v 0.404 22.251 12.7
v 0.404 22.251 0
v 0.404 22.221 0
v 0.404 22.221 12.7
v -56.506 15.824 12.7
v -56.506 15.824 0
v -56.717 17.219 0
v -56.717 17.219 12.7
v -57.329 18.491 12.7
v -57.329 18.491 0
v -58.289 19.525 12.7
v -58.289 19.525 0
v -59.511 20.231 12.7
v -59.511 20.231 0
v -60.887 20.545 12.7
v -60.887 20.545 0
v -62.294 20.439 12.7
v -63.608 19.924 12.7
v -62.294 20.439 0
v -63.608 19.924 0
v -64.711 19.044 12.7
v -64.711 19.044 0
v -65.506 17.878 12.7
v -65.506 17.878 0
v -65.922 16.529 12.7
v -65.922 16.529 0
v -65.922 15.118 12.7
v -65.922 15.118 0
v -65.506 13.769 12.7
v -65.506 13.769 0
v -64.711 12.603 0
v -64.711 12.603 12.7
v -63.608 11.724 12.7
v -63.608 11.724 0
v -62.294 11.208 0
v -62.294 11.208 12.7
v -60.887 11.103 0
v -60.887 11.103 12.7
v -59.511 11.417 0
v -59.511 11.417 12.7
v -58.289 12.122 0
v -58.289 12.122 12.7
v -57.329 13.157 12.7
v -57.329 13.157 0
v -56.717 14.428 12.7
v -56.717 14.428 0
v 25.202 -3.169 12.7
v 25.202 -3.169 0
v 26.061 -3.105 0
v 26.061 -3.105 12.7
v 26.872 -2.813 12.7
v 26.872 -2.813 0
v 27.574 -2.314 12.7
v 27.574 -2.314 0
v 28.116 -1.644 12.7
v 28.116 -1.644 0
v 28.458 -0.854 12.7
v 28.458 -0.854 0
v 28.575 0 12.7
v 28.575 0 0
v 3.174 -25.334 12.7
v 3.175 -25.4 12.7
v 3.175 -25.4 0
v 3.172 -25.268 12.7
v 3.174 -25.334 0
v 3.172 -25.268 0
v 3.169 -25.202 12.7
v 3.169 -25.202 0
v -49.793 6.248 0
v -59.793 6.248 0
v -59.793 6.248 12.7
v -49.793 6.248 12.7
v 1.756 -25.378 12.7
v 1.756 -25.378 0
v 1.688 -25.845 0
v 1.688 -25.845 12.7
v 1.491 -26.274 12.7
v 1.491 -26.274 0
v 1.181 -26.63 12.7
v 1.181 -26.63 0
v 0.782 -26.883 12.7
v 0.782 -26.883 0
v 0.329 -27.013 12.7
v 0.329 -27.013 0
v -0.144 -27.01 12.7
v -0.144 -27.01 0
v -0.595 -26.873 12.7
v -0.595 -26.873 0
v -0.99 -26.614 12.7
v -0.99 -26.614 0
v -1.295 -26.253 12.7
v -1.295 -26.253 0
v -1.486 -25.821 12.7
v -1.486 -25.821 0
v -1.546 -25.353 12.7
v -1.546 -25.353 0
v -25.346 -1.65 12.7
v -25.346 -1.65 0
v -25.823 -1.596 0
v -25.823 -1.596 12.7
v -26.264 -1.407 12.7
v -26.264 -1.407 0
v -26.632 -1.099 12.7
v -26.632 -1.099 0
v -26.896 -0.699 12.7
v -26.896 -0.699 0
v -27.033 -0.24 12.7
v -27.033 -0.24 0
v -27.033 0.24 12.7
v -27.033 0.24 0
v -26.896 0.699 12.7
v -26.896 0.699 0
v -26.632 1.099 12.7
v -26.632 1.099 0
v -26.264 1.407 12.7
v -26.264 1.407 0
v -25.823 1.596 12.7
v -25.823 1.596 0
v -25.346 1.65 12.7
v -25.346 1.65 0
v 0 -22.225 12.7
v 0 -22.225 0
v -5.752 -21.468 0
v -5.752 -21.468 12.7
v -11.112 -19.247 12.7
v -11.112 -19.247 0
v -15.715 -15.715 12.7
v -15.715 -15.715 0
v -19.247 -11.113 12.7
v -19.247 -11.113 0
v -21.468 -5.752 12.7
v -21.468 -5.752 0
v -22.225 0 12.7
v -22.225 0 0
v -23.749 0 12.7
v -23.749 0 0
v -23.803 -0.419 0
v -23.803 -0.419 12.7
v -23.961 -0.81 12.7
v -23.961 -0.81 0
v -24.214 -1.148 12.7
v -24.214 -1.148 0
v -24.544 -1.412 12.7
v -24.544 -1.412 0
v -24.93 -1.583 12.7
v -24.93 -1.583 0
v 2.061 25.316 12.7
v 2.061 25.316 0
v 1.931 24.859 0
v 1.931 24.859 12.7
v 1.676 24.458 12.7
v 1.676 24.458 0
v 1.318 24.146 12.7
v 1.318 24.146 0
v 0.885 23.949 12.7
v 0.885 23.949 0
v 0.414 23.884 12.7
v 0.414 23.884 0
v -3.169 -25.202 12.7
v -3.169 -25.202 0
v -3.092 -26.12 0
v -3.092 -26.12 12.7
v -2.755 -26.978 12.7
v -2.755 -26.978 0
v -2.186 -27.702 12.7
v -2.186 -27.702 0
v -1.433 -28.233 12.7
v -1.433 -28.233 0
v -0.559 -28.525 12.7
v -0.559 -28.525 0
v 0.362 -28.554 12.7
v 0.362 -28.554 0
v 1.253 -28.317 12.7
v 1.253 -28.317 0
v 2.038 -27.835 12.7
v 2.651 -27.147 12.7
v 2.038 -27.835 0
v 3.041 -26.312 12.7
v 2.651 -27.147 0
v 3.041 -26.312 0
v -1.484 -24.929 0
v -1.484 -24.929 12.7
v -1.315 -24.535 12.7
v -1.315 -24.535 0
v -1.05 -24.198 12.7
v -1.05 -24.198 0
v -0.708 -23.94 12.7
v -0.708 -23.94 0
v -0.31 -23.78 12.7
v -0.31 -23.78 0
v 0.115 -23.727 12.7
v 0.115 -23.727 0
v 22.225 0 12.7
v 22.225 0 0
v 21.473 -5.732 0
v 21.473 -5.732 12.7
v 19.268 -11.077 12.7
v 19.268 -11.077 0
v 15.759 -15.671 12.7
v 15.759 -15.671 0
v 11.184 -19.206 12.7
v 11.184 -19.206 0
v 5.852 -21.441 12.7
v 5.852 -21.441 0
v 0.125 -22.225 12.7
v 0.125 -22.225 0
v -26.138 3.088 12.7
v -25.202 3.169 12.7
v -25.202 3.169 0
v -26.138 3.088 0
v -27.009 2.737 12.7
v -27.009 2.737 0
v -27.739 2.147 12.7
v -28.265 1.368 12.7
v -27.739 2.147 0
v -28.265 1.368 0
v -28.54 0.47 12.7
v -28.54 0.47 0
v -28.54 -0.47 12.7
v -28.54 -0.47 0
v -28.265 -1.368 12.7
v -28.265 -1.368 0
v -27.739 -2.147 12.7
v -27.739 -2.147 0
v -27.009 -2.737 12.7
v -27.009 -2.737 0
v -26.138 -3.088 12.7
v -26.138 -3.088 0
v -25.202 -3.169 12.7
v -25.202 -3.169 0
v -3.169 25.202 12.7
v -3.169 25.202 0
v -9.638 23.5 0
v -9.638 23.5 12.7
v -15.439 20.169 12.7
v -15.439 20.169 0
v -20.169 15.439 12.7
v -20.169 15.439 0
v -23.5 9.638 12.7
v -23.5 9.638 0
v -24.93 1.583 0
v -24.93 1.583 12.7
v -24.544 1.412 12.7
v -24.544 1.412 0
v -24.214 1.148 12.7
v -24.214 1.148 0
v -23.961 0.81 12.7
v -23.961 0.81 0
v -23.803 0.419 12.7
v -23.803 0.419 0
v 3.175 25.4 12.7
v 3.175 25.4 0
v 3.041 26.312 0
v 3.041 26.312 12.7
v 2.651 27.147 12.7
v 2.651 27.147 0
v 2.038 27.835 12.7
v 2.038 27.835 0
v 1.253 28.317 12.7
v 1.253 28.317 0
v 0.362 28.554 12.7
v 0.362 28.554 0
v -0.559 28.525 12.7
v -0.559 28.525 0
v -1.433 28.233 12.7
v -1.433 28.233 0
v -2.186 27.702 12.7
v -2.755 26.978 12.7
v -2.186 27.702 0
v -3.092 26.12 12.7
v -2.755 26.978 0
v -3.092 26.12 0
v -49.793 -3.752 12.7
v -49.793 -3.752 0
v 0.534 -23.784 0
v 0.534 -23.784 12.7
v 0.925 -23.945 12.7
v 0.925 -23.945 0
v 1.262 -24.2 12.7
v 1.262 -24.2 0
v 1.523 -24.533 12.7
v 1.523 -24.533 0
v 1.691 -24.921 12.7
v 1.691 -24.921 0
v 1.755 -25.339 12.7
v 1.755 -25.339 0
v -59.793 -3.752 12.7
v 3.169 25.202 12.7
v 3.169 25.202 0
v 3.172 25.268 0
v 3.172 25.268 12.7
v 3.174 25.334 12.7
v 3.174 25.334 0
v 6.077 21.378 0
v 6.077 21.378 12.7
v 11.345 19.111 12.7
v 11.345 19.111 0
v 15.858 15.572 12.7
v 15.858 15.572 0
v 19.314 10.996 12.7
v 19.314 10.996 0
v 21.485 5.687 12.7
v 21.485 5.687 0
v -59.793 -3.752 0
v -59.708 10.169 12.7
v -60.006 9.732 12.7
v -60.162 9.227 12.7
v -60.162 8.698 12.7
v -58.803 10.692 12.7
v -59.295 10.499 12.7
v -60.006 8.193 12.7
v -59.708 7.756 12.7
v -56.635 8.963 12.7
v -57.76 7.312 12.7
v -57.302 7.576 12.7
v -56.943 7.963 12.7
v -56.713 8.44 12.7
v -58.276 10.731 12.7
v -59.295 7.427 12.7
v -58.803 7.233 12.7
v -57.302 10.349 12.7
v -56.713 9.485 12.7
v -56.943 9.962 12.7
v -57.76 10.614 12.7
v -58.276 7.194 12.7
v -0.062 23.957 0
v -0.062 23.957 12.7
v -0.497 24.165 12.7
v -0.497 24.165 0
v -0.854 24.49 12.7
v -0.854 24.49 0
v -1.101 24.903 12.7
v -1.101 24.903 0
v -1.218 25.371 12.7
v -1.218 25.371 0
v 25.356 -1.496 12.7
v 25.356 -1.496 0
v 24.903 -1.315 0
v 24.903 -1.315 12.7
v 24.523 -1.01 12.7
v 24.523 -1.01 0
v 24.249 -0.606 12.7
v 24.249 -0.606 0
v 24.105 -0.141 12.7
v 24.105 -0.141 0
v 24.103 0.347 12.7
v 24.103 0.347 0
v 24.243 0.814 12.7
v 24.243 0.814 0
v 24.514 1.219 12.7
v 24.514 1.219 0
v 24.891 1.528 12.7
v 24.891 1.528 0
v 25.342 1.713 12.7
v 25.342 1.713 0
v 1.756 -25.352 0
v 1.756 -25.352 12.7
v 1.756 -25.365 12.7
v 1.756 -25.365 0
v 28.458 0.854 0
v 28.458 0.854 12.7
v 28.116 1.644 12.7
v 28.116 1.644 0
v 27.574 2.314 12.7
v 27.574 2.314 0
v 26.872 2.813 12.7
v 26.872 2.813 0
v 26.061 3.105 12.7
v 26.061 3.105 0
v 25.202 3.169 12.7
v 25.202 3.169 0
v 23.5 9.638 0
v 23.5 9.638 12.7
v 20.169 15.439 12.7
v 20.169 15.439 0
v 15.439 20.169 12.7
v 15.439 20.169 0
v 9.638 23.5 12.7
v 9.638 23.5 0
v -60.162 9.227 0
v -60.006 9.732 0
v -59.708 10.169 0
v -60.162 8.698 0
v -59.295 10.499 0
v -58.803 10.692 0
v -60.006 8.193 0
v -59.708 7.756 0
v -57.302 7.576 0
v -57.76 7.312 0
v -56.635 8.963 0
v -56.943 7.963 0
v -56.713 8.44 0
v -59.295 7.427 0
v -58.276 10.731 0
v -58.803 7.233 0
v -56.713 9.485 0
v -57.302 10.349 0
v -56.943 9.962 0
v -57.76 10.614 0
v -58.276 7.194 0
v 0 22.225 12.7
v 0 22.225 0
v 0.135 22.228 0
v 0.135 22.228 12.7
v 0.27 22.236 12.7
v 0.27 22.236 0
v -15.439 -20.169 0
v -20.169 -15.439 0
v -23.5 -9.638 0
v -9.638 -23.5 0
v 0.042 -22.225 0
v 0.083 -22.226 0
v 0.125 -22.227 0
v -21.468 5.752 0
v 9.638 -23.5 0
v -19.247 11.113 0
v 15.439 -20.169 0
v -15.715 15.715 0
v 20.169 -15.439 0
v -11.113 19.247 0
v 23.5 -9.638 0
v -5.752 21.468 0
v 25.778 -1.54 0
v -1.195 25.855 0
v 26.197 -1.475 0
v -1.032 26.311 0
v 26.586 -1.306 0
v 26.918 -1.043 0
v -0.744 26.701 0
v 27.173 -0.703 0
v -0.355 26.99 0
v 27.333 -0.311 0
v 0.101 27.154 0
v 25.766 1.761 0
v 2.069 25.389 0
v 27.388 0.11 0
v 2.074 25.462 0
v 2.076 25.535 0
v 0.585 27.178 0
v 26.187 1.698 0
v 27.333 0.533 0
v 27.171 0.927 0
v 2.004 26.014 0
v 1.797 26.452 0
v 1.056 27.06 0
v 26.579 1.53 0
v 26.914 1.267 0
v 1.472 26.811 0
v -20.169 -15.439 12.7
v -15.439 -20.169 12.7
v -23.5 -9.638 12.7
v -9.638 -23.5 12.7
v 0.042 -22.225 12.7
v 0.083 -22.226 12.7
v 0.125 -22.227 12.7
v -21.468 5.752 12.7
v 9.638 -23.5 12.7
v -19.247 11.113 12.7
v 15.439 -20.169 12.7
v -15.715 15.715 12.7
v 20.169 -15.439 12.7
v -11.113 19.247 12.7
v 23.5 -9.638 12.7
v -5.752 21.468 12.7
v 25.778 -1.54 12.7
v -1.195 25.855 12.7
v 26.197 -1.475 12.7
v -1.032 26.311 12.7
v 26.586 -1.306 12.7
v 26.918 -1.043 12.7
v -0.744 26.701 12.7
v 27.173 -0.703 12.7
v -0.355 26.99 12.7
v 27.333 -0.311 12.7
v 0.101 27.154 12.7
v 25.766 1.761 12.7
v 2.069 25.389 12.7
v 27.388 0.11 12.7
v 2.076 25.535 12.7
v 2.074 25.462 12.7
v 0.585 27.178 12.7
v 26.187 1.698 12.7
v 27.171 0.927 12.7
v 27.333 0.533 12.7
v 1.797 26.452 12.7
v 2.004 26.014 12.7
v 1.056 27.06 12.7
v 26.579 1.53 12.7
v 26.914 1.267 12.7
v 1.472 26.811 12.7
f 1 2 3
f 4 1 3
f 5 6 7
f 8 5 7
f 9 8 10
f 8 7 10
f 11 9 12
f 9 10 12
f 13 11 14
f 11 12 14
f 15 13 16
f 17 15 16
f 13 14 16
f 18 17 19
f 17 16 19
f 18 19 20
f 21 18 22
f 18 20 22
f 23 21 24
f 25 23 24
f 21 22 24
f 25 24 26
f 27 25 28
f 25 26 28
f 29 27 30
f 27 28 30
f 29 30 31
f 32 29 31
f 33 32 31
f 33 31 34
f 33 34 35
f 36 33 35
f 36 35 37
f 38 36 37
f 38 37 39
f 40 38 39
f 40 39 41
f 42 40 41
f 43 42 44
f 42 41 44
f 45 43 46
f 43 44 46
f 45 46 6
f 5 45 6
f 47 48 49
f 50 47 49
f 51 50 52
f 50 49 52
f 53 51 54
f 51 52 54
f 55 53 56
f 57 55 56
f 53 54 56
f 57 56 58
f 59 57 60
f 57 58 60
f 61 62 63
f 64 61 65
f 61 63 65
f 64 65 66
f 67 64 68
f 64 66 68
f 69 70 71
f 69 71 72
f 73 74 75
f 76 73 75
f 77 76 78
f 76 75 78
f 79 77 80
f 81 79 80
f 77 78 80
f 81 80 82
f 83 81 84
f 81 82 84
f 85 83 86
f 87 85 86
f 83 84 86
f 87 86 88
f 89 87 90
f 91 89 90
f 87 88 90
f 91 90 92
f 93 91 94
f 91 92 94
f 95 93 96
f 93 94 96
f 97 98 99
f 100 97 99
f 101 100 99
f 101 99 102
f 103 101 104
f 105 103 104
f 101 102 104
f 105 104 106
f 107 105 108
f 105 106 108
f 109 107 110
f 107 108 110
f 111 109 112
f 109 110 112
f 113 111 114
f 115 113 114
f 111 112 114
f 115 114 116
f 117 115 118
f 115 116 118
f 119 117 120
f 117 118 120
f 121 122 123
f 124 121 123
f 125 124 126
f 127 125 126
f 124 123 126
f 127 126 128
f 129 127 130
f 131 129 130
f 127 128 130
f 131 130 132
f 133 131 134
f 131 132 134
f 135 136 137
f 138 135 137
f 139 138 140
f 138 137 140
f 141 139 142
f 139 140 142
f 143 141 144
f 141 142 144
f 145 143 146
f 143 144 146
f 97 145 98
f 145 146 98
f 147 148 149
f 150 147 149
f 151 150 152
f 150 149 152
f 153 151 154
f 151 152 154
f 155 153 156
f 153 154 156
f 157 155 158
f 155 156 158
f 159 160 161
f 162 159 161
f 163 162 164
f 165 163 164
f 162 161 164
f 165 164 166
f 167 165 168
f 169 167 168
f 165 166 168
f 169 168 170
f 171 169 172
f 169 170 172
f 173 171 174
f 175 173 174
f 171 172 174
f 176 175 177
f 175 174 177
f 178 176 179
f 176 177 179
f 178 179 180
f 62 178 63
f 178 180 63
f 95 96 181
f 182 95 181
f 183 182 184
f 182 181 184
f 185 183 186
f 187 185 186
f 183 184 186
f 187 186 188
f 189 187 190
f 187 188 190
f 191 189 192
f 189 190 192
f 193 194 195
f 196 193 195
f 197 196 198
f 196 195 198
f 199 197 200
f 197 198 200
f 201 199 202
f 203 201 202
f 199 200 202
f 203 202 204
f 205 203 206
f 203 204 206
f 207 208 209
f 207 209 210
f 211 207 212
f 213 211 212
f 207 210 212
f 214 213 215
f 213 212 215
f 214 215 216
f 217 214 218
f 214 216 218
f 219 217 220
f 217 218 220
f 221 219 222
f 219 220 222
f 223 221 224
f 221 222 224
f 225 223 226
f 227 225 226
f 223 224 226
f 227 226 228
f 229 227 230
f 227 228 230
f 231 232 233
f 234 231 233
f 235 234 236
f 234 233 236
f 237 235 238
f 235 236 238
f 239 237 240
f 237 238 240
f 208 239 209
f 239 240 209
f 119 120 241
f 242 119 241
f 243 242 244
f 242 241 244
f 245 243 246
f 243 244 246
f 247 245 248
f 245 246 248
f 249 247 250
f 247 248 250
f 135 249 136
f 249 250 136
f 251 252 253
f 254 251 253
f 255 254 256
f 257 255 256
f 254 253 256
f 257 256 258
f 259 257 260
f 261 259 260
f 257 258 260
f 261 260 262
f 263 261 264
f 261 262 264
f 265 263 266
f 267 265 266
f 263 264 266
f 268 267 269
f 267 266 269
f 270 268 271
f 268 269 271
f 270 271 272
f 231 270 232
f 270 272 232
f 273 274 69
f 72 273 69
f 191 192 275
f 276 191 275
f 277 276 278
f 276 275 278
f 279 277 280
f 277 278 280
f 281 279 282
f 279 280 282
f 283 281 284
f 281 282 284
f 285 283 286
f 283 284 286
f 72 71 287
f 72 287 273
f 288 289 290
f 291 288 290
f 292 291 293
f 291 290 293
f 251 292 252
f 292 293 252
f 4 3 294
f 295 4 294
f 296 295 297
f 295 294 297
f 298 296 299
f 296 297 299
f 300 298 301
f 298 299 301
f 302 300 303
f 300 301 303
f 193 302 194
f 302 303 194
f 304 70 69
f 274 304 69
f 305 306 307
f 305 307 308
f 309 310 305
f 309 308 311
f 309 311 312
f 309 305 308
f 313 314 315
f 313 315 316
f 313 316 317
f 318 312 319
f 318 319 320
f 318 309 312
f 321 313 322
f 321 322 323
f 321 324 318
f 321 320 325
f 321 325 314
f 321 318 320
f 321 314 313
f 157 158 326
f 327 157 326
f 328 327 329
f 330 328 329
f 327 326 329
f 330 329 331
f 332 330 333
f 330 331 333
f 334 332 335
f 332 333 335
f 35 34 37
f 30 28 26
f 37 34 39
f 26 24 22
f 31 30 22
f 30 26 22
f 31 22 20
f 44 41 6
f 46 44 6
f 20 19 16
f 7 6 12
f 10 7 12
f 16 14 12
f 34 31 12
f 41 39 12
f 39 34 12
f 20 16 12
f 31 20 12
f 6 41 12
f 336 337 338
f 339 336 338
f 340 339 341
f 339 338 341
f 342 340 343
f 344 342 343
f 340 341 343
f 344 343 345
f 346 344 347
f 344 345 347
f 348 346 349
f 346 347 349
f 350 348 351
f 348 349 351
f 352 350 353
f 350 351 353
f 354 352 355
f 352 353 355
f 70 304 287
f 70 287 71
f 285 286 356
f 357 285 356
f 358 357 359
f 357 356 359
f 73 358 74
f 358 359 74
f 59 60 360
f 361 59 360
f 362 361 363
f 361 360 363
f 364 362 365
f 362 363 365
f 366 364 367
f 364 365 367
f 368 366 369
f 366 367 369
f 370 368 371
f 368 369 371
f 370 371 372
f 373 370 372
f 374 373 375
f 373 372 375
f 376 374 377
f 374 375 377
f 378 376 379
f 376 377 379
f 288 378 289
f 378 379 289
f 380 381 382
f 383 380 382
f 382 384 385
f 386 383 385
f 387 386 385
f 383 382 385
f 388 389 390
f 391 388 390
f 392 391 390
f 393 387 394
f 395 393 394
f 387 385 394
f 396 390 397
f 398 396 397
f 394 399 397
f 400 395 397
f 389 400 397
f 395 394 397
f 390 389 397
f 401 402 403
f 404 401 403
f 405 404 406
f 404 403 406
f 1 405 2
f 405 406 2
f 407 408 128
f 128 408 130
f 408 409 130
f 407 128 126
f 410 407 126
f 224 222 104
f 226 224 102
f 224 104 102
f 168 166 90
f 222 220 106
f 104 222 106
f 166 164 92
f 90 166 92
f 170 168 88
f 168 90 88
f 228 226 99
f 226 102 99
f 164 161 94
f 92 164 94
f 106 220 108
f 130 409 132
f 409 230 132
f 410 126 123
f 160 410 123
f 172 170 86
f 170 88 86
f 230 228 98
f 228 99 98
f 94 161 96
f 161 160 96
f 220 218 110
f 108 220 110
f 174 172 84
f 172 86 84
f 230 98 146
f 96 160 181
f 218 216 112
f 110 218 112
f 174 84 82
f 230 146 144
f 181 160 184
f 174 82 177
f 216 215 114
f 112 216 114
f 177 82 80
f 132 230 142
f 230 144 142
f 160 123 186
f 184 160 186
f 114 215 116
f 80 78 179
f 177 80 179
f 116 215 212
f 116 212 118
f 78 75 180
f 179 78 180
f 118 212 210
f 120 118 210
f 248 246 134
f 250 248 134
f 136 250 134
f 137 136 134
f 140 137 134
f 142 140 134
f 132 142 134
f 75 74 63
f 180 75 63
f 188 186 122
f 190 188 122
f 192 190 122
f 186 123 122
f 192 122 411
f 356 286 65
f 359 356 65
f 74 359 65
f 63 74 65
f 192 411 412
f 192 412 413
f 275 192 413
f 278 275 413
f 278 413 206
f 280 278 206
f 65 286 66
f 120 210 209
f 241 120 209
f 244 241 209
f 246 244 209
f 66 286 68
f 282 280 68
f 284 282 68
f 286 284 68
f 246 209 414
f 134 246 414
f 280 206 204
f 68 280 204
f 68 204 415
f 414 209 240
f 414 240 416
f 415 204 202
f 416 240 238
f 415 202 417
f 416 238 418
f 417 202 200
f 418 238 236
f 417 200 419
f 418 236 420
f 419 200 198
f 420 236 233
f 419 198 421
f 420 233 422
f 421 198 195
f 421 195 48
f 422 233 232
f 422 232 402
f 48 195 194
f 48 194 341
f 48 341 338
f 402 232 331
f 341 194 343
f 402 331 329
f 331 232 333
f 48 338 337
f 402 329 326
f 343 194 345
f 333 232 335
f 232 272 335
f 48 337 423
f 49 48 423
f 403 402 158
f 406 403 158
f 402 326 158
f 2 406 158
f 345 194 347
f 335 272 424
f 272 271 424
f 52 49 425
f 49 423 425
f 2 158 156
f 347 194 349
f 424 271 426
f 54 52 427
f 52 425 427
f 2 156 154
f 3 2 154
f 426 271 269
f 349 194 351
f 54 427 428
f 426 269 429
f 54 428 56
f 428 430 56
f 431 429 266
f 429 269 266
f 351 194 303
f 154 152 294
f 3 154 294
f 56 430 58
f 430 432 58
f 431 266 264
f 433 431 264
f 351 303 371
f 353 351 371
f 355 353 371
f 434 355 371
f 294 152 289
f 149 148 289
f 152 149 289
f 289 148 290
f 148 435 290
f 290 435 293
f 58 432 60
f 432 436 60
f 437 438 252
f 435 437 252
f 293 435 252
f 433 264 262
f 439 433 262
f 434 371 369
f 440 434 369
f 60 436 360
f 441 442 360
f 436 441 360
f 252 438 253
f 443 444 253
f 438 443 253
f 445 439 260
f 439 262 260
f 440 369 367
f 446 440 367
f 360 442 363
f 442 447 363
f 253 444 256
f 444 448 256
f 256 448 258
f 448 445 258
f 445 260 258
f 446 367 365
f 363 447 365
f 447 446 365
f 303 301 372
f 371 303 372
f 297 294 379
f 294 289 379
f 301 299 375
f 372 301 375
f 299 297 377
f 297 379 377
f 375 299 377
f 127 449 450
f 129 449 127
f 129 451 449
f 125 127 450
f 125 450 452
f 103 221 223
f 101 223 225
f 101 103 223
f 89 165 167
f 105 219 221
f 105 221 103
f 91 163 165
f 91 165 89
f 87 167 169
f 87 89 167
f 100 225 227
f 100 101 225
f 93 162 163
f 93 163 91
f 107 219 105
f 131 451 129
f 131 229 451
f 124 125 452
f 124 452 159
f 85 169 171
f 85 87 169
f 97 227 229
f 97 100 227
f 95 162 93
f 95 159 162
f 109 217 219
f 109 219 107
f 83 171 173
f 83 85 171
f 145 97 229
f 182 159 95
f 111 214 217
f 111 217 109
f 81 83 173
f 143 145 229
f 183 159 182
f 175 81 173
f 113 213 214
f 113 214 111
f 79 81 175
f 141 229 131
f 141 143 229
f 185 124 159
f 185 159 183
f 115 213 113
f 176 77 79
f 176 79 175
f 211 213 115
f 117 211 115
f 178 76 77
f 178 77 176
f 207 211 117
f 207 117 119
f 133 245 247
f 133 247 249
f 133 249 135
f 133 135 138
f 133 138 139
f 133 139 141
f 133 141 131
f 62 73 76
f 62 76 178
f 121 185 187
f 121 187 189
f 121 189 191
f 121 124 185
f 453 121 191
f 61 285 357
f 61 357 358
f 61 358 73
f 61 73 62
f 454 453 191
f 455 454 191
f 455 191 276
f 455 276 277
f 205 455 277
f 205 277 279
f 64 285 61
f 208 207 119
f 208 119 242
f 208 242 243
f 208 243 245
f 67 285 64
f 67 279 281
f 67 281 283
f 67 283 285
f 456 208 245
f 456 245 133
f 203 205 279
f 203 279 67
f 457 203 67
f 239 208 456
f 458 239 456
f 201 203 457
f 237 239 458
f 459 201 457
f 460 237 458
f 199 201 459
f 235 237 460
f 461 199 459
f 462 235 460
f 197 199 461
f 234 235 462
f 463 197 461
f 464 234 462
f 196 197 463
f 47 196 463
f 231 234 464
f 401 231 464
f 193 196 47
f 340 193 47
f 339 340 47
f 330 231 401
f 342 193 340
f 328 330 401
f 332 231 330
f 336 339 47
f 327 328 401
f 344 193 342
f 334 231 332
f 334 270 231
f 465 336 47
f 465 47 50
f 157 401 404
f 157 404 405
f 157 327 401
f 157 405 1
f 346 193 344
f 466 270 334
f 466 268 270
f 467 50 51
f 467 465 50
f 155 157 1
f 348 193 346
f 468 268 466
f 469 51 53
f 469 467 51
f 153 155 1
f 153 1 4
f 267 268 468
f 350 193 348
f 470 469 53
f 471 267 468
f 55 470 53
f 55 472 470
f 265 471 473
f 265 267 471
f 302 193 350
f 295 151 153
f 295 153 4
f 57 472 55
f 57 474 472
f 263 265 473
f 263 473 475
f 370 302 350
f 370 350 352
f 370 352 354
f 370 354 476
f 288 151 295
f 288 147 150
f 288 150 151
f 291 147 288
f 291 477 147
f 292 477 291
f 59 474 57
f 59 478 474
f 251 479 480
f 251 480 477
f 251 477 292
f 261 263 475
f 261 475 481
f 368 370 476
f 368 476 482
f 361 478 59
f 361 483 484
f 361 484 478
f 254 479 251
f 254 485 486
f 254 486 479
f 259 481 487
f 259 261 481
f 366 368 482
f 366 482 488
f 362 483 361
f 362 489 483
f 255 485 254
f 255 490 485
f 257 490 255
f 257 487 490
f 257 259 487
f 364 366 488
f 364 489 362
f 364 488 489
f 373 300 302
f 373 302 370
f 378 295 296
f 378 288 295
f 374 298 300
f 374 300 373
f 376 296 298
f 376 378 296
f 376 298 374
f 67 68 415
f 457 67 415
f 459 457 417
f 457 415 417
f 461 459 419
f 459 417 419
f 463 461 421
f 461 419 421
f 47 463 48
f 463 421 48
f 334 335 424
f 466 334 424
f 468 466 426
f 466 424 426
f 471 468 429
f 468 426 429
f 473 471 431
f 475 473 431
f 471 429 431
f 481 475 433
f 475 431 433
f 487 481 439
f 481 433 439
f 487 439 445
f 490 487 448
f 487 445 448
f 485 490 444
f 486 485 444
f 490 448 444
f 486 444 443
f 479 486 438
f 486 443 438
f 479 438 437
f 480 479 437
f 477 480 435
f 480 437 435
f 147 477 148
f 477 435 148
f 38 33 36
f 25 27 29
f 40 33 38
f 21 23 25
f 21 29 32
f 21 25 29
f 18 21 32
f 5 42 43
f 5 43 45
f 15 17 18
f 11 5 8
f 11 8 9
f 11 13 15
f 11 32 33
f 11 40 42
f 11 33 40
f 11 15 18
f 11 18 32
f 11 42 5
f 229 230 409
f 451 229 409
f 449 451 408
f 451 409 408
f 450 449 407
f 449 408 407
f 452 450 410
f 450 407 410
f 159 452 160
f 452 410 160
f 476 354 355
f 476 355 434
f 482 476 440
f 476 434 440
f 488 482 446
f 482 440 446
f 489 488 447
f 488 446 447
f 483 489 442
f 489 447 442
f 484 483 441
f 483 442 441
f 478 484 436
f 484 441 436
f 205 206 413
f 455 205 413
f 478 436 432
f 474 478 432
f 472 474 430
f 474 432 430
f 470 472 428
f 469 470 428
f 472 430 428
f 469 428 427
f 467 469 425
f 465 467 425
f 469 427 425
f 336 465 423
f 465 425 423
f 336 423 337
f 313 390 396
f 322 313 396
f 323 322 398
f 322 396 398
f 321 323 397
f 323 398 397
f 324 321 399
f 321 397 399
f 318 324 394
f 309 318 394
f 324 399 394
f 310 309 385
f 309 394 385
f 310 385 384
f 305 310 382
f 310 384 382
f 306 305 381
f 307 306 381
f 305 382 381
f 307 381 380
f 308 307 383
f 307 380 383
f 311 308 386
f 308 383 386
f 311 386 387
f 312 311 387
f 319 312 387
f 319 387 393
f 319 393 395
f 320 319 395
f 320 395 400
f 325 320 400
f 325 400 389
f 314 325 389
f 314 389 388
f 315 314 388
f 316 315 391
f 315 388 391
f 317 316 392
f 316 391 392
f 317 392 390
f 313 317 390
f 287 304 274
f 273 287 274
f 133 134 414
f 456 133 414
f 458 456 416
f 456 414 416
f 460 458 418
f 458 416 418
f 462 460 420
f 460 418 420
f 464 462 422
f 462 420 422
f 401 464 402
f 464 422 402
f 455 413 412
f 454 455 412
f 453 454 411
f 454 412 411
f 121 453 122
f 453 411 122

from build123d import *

# Parameters (mm, degrees)
F1_DEPTH = 12.7
F0_R     = 4.7343044343
F0_R_2   = 1.7736738102
F0_W     = 10
F0_H     = 10


with BuildPart() as f1:
    # F0 (on Top) → F1 (new body)
    with BuildSketch(Plane.XY):
        with BuildLine():
            ThreePointArc((25.3558840705, -1.4963766246), (24.085578025, 0.1030713696), (25.3421485002, 1.7133328318))
            ThreePointArc((25.3421485002, 1.7133328318), (25.2823312082, 2.4420746672), (25.2015625, 3.1687927604))
            ThreePointArc((25.2015625, 3.1687927604), (23.0858409667, 2.1737739001), (22.225, 0))
            ThreePointArc((22.225, 0), (23.0858409667, -2.1737739001), (25.2015625, -3.1687927604))
            ThreePointArc((25.2015625, -3.1687927604), (25.2925501851, -2.3338605645), (25.3558840705, -1.4963766246))
        make_face()
        with BuildLine():
            ThreePointArc((25.2015625, 3.1687927604), (25.2823312082, 2.4420746672), (25.3421485002, 1.7133328318))
            ThreePointArc((25.3421485002, 1.7133328318), (26.755047766, 1.4095555078), (27.3875629077, 0.1101365633))
            ThreePointArc((27.3875629077, 0.1101365633), (26.7605990984, -1.1849120381), (25.3558840705, -1.4963766246))
            ThreePointArc((25.3558840705, -1.4963766246), (25.2925501851, -2.3338605645), (25.2015625, -3.1687927604))
            ThreePointArc((25.2015625, -3.1687927604), (27.5737739001, -2.3141590333), (28.575, 0))
            ThreePointArc((28.575, 0), (27.5737739001, 2.3141590333), (25.2015625, 3.1687927604))
        make_face()
        with BuildLine():
            ThreePointArc((22.225, 0), (23.0858409667, 2.1737739001), (25.2015625, 3.1687927604))
            ThreePointArc((25.2015625, 3.1687927604), (17.9605122421, 17.9605122421), (3.1687927604, 25.2015625))
            ThreePointArc((3.1687927604, 25.2015625), (2.3168608274, 23.2291059661), (0.4039338373, 22.2507997118))
            Line((0.4039338373, 22.2507997118), (0.4037487557, 22.221332362))
            ThreePointArc((0.4037487557, 22.221332362), (15.8575524766, 15.5720472146), (22.225, 0))
        make_face()
        with BuildLine():
            ThreePointArc((3.1687927604, -25.2015625), (17.9605122421, -17.9605122421), (25.2015625, -3.1687927604))
            ThreePointArc((25.2015625, -3.1687927604), (23.0858409667, -2.1737739001), (22.225, 0))
            ThreePointArc((22.225, 0), (15.7594350485, -15.671337912), (0.124587676, -22.2246507939))
            Line((0.124587676, -22.2246507939), (0.1245701278, -22.2274446761))
            ThreePointArc((0.1245701278, -22.2274446761), (2.2187618137, -23.1289383509), (3.1687927604, -25.2015625))
        make_face()
        with BuildLine():
            ThreePointArc((0.4039338373, 22.2507997118), (2.3168608274, 23.2291059661), (3.1687927604, 25.2015625))
            ThreePointArc((3.1687927604, 25.2015625), (2.6155497493, 25.2649737682), (2.0610495634, 25.3162413225))
            ThreePointArc((2.0610495634, 25.3162413225), (1.5081301648, 24.2889839746), (0.414189801, 23.8836791504))
            Line((0.414189801, 23.8836791504), (0.4039338373, 22.2507997118))
        make_face()
        with BuildLine():
            ThreePointArc((2.0610495634, 25.3162413225), (2.6155497493, 25.2649737682), (3.1687927604, 25.2015625))
            ThreePointArc((3.1687927604, 25.2015625), (3.1734478107, 25.3007327204), (3.175, 25.4))
            ThreePointArc((3.175, 25.4), (-0.0992672796, 28.5734478107), (-3.1687927604, 25.2015625))
            ThreePointArc((-3.1687927604, 25.2015625), (-2.1951707638, 25.3049644402), (-1.218287002, 25.3707661843))
            ThreePointArc((-1.218287002, 25.3707661843), (0.3425178179, 27.1836069196), (2.0755593736, 25.5346465856))
            ThreePointArc((2.0755593736, 25.5346465856), (2.0719279273, 25.4252032286), (2.0610495634, 25.3162413225))
        make_face()
        with BuildLine():
            ThreePointArc((3.175, -25.4), (3.1734478107, -25.3007327204), (3.1687927604, -25.2015625))
            ThreePointArc((3.1687927604, -25.2015625), (2.463027482, -25.2802985667), (1.7553369221, -25.3392737128))
            ThreePointArc((1.7553369221, -25.3392737128), (1.7556720559, -25.3584772275), (1.7557837723, -25.3776833415))
            ThreePointArc((1.7557837723, -25.3776833415), (0.0923942372, -27.0286368537), (-1.5460302791, -25.3529049692))
            ThreePointArc((-1.5460302791, -25.3529049692), (-2.3586257035, -25.2902527625), (-3.1687927604, -25.2015625))
            ThreePointArc((-3.1687927604, -25.2015625), (-0.0992672796, -28.5734478107), (3.175, -25.4))
        make_face()
        with BuildLine():
            ThreePointArc((1.7553369221, -25.3392737128), (2.463027482, -25.2802985667), (3.1687927604, -25.2015625))
            ThreePointArc((3.1687927604, -25.2015625), (2.2187618137, -23.1289383509), (0.1245701278, -22.2274446761))
            Line((0.1245701278, -22.2274446761), (0.1151533449, -23.7267159063))
            ThreePointArc((0.1151533449, -23.7267159063), (1.2622602266, -24.2003774094), (1.7553369221, -25.3392737128))
        make_face()
        with BuildLine():
            ThreePointArc((0, 22.225), (0.2023784636, 22.2314564927), (0.4039338373, 22.2507997118))
            Line((0.4039338373, 22.2507997118), (0.414189801, 23.8836791504))
            ThreePointArc((0.414189801, 23.8836791504), (-0.6872579246, 24.3141289514), (-1.218287002, 25.3707661843))
            ThreePointArc((-1.218287002, 25.3707661843), (-2.1951707638, 25.3049644402), (-3.1687927604, 25.2015625))
            ThreePointArc((-3.1687927604, 25.2015625), (-2.1737739001, 23.0858409667), (0, 22.225))
        make_face()
        with BuildLine():
            Line((0.1151533449, -23.7267159063), (0.1245701278, -22.2274446761))
            ThreePointArc((0.1245701278, -22.2274446761), (0.0622970766, -22.2256112282), (3.94e-08, -22.225))
            ThreePointArc((3.94e-08, -22.225), (-2.1737738858, -23.0858409533), (-3.1687927604, -25.2015625))
            ThreePointArc((-3.1687927604, -25.2015625), (-2.3586257035, -25.2902527625), (-1.5460302791, -25.3529049692))
            ThreePointArc((-1.5460302791, -25.3529049692), (-1.0501565894, -24.197889393), (0.1151533449, -23.7267159063))
        make_face()
        with BuildLine():
            ThreePointArc((-22.225, 0), (-15.7154482119, 15.7154482119), (0, 22.225))
            ThreePointArc((0, 22.225), (-2.1737739001, 23.0858409667), (-3.1687927604, 25.2015625))
            ThreePointArc((-3.1687927604, 25.2015625), (-17.9605122421, 17.9605122421), (-25.2015625, 3.1687927604))
            ThreePointArc((-25.2015625, 3.1687927604), (-23.0858409667, 2.1737739001), (-22.225, 0))
        make_face()
        with BuildLine():
            ThreePointArc((-3.1687927604, -25.2015625), (-2.1737738858, -23.0858409533), (3.94e-08, -22.225))
            ThreePointArc((3.94e-08, -22.225), (-15.715448198, -15.7154482258), (-22.225, 0))
            ThreePointArc((-22.225, 0), (-23.0858409667, -2.1737739001), (-25.2015625, -3.1687927604))
            ThreePointArc((-25.2015625, -3.1687927604), (-17.9605122421, -17.9605122421), (-3.1687927604, -25.2015625))
        make_face()
        with BuildLine():
            ThreePointArc((-25.2015625, -3.1687927604), (-23.0858409667, -2.1737739001), (-22.225, 0))
            ThreePointArc((-22.225, 0), (-23.0858409667, 2.1737739001), (-25.2015625, 3.1687927604))
            ThreePointArc((-25.2015625, 3.1687927604), (-25.2853566469, 2.4105474978), (-25.3463425, 1.6501278353))
            ThreePointArc((-25.3463425, 1.6501278353), (-24.2137475959, 1.1483058102), (-23.749, 0))
            ThreePointArc((-23.749, 0), (-24.2137475959, -1.1483058102), (-25.3463425, -1.6501278353))
            ThreePointArc((-25.3463425, -1.6501278353), (-25.2853566469, -2.4105474978), (-25.2015625, -3.1687927604))
        make_face()
        with BuildLine():
            ThreePointArc((-25.3463425, 1.6501278353), (-25.2853566469, 2.4105474978), (-25.2015625, 3.1687927604))
            ThreePointArc((-25.2015625, 3.1687927604), (-28.575, 0), (-25.2015625, -3.1687927604))
            ThreePointArc((-25.2015625, -3.1687927604), (-25.2853566469, -2.4105474978), (-25.3463425, -1.6501278353))
            ThreePointArc((-25.3463425, -1.6501278353), (-27.051, 0), (-25.3463425, 1.6501278353))
        make_face()
    extrude(amount=F1_DEPTH)


with BuildPart() as f1b:
    # F0 (on Top) → F1, piece 2 (new body)
    with BuildSketch(Plane.XY):
        with Locations((-61.2407773733, 15.8236231655)):
            Circle(F0_R)
    extrude(amount=F1_DEPTH)


with BuildPart() as f1c:
    # F0 (on Top) → F1, piece 3 (new body)
    with BuildSketch(Plane.XY):
        with Locations((-58.408241719, 8.9625855908)):
            Circle(F0_R_2)
    extrude(amount=F1_DEPTH)


with BuildPart() as f1d:
    # F0 (on Top) → F1, piece 4 (new body)
    with BuildSketch(Plane.XY):
        with Locations((-54.7930364311, 1.2476359215)):
            Rectangle(F0_W, F0_H)
    extrude(amount=F1_DEPTH)


solid = Compound([f1.part, f1b.part, f1c.part, f1d.part])
